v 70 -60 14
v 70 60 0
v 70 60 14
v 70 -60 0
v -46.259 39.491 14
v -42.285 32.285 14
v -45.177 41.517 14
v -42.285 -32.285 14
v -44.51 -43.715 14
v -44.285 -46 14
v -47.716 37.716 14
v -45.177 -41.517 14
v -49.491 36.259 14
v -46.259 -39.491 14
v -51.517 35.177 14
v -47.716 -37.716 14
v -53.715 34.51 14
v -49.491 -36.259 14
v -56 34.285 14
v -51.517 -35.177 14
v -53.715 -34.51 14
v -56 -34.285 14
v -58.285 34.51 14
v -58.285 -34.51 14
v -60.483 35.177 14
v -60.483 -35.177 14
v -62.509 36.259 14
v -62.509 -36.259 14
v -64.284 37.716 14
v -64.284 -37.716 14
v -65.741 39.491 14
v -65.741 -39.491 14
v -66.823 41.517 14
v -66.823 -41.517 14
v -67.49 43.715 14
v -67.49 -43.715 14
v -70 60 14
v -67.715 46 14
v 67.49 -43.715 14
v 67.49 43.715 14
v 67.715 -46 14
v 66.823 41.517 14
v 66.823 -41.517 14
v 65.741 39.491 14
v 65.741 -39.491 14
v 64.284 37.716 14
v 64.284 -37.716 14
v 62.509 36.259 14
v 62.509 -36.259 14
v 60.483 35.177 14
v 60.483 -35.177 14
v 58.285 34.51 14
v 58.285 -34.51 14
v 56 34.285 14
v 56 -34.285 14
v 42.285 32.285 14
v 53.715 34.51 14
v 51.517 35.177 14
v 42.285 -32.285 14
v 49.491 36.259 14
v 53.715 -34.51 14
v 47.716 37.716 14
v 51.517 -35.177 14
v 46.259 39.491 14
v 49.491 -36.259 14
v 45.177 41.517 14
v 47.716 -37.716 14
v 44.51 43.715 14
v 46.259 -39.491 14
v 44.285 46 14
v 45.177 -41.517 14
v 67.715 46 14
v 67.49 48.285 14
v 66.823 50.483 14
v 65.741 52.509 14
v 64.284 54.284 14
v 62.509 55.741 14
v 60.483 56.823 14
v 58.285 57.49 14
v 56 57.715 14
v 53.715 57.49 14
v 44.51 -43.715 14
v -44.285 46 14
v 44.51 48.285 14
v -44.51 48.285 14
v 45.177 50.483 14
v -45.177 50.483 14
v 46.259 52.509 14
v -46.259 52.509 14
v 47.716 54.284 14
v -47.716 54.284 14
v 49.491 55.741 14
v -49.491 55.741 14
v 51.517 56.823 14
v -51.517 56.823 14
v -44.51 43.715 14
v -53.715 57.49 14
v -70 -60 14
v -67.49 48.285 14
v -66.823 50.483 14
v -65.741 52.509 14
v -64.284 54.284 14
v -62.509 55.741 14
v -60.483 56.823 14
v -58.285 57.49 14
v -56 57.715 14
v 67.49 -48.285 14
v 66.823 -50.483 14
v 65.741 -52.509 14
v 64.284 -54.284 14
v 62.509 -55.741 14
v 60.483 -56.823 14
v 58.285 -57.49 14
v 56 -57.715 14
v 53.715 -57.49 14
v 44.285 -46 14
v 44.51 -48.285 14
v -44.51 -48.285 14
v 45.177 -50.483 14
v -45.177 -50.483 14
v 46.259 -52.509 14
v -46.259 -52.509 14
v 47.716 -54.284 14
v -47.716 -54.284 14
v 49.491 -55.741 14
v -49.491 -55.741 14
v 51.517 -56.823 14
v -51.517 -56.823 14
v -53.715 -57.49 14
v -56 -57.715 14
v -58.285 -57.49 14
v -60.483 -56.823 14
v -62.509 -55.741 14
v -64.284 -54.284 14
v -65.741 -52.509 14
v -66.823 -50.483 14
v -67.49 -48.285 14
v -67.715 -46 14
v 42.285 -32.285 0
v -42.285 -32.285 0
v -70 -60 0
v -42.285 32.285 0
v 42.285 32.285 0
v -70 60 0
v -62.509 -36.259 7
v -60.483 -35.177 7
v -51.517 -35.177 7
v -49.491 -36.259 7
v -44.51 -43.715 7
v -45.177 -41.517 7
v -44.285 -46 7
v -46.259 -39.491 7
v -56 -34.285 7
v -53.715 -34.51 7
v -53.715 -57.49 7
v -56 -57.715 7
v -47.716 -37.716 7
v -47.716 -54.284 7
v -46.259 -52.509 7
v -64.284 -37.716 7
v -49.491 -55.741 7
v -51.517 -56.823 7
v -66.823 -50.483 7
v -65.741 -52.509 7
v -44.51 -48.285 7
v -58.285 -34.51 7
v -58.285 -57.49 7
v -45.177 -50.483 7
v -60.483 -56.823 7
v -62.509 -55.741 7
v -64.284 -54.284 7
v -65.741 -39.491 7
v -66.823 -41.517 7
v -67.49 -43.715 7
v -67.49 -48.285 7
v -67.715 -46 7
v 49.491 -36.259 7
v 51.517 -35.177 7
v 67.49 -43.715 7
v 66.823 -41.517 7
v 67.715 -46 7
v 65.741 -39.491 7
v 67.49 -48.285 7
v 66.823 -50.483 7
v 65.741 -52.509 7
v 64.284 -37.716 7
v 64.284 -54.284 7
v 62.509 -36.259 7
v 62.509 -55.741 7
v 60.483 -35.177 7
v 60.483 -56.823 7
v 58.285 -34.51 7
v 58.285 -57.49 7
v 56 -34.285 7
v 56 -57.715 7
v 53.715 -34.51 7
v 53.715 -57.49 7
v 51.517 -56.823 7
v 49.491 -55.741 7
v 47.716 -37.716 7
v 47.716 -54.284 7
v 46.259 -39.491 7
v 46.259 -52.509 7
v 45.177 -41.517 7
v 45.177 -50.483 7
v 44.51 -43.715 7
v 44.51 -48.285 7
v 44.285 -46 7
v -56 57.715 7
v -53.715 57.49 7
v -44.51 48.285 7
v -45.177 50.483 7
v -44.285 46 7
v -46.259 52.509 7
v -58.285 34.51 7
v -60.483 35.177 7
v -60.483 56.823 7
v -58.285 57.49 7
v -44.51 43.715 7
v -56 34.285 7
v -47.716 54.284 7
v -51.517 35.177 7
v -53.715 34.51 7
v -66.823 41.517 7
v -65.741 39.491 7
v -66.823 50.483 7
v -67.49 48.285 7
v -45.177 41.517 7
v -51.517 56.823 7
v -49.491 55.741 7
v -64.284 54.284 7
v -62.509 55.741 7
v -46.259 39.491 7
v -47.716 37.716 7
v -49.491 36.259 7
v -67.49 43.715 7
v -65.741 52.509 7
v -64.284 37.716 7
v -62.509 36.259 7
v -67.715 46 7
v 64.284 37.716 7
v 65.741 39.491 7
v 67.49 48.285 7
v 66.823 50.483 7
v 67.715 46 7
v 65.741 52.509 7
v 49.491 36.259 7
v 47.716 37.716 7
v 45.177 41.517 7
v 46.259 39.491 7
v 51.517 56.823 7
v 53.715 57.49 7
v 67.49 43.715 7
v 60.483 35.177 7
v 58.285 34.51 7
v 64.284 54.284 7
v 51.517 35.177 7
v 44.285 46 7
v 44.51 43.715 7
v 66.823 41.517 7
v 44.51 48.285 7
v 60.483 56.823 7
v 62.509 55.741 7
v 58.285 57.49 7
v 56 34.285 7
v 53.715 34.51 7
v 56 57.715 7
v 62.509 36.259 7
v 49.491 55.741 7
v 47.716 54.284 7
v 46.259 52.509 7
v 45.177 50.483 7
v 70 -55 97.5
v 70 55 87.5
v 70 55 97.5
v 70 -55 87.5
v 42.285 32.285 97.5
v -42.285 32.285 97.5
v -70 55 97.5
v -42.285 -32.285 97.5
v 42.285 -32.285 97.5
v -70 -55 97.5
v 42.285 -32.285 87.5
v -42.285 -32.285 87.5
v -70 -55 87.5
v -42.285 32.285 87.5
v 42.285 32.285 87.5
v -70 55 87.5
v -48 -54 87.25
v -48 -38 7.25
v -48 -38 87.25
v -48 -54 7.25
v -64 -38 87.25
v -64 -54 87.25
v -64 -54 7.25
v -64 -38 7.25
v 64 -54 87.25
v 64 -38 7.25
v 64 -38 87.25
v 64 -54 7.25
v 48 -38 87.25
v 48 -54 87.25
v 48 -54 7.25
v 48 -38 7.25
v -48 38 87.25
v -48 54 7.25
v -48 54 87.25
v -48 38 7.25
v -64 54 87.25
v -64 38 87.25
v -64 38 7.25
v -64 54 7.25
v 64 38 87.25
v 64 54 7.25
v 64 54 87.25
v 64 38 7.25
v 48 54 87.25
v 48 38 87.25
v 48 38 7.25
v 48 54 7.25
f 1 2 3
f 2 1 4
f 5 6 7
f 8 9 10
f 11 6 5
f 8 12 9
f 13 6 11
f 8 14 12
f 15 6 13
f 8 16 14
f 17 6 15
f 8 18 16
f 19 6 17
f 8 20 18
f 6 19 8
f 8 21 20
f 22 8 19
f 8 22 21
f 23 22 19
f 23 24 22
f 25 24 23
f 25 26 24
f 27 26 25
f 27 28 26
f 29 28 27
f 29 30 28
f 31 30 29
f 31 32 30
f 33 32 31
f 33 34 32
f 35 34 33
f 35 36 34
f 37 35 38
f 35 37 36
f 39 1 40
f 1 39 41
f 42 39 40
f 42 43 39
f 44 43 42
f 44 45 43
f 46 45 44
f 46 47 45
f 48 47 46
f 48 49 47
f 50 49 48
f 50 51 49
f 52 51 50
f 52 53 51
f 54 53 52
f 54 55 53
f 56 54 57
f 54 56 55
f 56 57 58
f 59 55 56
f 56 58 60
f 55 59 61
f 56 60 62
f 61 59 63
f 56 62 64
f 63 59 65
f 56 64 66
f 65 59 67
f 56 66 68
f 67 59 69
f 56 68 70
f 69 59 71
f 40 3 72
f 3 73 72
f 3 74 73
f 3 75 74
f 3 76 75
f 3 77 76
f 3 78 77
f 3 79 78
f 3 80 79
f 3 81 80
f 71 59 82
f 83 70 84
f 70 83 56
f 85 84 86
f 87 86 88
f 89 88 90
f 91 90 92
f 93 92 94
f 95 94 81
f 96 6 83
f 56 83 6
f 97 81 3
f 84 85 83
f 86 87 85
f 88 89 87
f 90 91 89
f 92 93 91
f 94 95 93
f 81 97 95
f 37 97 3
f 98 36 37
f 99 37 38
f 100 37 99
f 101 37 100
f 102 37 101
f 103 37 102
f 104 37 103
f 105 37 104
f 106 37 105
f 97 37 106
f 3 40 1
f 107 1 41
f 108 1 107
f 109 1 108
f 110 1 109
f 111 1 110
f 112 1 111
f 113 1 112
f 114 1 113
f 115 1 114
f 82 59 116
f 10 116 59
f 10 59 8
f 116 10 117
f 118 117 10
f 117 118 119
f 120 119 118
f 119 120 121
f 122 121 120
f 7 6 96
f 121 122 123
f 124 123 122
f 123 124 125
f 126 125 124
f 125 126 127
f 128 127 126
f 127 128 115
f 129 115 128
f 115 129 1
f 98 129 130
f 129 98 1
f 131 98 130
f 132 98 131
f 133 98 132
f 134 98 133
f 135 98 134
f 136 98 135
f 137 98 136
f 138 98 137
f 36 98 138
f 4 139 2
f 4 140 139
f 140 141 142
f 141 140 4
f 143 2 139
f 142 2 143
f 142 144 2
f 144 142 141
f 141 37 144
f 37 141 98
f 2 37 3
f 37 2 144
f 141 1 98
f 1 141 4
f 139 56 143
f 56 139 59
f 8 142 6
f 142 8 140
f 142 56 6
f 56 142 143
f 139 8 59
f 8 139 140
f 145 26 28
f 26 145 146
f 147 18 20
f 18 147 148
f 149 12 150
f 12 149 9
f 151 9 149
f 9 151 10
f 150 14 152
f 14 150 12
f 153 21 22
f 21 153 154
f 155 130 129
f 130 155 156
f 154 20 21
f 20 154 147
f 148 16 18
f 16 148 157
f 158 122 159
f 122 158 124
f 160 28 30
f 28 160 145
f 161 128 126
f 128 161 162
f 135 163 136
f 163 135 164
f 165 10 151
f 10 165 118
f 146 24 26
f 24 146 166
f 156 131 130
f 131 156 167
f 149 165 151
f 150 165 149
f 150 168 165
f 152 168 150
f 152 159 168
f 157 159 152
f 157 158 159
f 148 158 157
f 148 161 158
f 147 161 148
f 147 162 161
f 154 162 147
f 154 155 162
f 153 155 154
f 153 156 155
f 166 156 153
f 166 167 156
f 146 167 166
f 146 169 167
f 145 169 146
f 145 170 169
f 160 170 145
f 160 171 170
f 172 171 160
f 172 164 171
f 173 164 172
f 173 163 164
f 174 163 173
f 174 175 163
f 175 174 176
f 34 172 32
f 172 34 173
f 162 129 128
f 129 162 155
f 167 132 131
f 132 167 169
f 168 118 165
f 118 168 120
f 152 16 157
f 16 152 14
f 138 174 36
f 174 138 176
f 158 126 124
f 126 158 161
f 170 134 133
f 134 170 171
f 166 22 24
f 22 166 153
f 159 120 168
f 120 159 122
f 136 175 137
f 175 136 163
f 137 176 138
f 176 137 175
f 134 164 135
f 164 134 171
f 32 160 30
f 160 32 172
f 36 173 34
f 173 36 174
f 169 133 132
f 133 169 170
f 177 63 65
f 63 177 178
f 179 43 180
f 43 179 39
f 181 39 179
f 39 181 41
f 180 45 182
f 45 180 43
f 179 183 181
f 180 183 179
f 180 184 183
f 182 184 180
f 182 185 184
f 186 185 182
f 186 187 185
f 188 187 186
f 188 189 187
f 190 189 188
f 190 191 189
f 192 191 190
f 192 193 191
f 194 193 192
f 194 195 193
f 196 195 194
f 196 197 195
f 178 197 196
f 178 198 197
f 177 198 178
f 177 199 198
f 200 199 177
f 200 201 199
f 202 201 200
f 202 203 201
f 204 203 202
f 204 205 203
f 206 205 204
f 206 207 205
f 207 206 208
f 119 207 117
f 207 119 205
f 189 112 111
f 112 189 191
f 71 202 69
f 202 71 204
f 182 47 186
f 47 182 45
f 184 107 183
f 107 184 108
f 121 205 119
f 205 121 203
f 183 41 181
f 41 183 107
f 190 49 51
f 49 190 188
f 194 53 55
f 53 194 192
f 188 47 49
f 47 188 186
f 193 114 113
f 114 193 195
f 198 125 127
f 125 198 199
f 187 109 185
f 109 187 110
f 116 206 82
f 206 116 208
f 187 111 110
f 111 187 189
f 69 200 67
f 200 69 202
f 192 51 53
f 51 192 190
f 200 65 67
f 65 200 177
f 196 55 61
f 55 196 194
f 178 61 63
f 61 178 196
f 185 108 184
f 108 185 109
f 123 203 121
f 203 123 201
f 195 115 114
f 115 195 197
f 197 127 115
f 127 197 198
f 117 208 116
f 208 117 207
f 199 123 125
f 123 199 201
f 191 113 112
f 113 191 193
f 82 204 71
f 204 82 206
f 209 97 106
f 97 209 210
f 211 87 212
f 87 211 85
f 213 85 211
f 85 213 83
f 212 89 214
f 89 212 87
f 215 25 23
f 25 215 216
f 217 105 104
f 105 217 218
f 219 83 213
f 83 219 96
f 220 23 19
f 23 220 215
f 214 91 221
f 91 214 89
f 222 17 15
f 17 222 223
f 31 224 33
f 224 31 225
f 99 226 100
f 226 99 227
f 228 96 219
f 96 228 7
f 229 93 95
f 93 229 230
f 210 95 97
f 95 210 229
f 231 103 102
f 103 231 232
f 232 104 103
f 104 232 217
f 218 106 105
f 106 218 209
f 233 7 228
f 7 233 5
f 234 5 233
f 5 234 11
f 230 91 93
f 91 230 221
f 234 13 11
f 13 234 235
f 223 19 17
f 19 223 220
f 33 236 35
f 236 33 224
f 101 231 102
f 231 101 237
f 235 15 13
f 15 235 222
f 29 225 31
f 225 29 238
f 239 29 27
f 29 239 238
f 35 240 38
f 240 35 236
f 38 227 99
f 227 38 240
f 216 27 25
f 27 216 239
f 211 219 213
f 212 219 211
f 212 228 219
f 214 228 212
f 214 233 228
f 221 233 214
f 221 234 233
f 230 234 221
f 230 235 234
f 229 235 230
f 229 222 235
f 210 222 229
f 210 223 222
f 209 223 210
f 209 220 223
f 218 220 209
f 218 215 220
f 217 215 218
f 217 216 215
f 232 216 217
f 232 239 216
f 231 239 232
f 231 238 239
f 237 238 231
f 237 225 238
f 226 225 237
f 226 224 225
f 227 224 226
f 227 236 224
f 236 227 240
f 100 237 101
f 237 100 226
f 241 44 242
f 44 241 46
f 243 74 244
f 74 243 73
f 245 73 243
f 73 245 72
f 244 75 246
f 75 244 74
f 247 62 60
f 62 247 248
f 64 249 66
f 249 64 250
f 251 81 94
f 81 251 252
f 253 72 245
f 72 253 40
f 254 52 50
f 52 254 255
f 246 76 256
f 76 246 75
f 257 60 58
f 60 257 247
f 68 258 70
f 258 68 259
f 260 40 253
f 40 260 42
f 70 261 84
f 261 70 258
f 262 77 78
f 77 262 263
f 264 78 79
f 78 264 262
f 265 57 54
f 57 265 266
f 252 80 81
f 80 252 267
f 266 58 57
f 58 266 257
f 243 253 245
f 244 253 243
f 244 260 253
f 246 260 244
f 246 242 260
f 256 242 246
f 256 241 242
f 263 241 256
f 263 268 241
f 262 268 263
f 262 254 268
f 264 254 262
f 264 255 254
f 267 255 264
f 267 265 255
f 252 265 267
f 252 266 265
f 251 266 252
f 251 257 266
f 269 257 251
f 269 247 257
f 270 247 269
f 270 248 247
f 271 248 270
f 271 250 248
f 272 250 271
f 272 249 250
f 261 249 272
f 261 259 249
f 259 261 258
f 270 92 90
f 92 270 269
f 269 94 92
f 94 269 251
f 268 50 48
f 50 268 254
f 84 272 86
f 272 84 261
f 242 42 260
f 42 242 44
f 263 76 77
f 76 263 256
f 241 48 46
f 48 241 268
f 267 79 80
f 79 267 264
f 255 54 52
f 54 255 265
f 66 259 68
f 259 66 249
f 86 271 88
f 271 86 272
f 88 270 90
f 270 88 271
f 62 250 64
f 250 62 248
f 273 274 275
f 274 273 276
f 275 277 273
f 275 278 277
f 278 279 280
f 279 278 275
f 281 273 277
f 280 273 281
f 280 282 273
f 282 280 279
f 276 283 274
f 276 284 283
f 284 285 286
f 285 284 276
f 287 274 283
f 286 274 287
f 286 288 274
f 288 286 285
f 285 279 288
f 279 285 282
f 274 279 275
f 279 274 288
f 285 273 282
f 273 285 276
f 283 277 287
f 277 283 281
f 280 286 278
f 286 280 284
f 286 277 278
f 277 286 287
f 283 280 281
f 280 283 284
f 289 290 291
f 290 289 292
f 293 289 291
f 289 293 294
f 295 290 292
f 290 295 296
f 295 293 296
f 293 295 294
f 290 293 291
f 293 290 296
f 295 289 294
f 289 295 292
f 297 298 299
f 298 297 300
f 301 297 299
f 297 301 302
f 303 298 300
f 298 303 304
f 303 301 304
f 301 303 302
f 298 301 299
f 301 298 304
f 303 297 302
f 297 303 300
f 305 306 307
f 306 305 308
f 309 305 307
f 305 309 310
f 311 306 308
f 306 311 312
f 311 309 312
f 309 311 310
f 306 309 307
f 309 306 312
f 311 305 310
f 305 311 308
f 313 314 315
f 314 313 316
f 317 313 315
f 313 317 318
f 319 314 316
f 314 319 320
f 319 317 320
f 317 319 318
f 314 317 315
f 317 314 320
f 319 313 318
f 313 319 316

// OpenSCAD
$fn = 32;

// ------------------------------------------------------------------------
// Frame cube: base 140 x 120 mm, posts 80 mm tall
// Every part is its own module, assembly() places every instance.
// ------------------------------------------------------------------------

// --- part 1 ---
module base_frame() {
  difference() {
    translate([-70, -60, 0]) cube([140, 120, 14]);
    translate([-42.285, -32.285, -1]) cube([84.57, 64.57, 16]);
    translate([-56, -46, 7]) cylinder(h = 8, d = 23.43);
    translate([56, -46, 7]) cylinder(h = 8, d = 23.43);
    translate([-56, 46, 7]) cylinder(h = 8, d = 23.43);
    translate([56, 46, 7]) cylinder(h = 8, d = 23.43);
  }
}

// --- part 2 ---
module corner_post() {
  translate([-8, -8, 0]) cube([16, 16, 80]);
}

// --- part 3 ---
module top_frame() {
  difference() {
    translate([-70, -55, 0]) cube([140, 110, 10]);
    translate([-42.285, -32.285, -1]) cube([84.57, 64.57, 12]);
  }
}

// --- assembly ---
module assembly() {
  color([0.80, 0.24, 0.20]) translate([0, 0, 0]) rotate([0, 0, 0]) base_frame();
  color([0.20, 0.45, 0.75]) translate([-56, -46, 7.25]) rotate([0, 0, 0]) corner_post();
  color([0.25, 0.62, 0.32]) translate([56, -46, 7.25]) rotate([0, 0, 0]) corner_post();
  color([0.92, 0.70, 0.18]) translate([-56, 46, 7.25]) rotate([0, 0, 0]) corner_post();
  color([0.58, 0.35, 0.70]) translate([56, 46, 7.25]) rotate([0, 0, 0]) corner_post();
  color([0.16, 0.66, 0.66]) translate([0, 0, 87.5]) rotate([0, 0, 0]) top_frame();
}

assembly();
